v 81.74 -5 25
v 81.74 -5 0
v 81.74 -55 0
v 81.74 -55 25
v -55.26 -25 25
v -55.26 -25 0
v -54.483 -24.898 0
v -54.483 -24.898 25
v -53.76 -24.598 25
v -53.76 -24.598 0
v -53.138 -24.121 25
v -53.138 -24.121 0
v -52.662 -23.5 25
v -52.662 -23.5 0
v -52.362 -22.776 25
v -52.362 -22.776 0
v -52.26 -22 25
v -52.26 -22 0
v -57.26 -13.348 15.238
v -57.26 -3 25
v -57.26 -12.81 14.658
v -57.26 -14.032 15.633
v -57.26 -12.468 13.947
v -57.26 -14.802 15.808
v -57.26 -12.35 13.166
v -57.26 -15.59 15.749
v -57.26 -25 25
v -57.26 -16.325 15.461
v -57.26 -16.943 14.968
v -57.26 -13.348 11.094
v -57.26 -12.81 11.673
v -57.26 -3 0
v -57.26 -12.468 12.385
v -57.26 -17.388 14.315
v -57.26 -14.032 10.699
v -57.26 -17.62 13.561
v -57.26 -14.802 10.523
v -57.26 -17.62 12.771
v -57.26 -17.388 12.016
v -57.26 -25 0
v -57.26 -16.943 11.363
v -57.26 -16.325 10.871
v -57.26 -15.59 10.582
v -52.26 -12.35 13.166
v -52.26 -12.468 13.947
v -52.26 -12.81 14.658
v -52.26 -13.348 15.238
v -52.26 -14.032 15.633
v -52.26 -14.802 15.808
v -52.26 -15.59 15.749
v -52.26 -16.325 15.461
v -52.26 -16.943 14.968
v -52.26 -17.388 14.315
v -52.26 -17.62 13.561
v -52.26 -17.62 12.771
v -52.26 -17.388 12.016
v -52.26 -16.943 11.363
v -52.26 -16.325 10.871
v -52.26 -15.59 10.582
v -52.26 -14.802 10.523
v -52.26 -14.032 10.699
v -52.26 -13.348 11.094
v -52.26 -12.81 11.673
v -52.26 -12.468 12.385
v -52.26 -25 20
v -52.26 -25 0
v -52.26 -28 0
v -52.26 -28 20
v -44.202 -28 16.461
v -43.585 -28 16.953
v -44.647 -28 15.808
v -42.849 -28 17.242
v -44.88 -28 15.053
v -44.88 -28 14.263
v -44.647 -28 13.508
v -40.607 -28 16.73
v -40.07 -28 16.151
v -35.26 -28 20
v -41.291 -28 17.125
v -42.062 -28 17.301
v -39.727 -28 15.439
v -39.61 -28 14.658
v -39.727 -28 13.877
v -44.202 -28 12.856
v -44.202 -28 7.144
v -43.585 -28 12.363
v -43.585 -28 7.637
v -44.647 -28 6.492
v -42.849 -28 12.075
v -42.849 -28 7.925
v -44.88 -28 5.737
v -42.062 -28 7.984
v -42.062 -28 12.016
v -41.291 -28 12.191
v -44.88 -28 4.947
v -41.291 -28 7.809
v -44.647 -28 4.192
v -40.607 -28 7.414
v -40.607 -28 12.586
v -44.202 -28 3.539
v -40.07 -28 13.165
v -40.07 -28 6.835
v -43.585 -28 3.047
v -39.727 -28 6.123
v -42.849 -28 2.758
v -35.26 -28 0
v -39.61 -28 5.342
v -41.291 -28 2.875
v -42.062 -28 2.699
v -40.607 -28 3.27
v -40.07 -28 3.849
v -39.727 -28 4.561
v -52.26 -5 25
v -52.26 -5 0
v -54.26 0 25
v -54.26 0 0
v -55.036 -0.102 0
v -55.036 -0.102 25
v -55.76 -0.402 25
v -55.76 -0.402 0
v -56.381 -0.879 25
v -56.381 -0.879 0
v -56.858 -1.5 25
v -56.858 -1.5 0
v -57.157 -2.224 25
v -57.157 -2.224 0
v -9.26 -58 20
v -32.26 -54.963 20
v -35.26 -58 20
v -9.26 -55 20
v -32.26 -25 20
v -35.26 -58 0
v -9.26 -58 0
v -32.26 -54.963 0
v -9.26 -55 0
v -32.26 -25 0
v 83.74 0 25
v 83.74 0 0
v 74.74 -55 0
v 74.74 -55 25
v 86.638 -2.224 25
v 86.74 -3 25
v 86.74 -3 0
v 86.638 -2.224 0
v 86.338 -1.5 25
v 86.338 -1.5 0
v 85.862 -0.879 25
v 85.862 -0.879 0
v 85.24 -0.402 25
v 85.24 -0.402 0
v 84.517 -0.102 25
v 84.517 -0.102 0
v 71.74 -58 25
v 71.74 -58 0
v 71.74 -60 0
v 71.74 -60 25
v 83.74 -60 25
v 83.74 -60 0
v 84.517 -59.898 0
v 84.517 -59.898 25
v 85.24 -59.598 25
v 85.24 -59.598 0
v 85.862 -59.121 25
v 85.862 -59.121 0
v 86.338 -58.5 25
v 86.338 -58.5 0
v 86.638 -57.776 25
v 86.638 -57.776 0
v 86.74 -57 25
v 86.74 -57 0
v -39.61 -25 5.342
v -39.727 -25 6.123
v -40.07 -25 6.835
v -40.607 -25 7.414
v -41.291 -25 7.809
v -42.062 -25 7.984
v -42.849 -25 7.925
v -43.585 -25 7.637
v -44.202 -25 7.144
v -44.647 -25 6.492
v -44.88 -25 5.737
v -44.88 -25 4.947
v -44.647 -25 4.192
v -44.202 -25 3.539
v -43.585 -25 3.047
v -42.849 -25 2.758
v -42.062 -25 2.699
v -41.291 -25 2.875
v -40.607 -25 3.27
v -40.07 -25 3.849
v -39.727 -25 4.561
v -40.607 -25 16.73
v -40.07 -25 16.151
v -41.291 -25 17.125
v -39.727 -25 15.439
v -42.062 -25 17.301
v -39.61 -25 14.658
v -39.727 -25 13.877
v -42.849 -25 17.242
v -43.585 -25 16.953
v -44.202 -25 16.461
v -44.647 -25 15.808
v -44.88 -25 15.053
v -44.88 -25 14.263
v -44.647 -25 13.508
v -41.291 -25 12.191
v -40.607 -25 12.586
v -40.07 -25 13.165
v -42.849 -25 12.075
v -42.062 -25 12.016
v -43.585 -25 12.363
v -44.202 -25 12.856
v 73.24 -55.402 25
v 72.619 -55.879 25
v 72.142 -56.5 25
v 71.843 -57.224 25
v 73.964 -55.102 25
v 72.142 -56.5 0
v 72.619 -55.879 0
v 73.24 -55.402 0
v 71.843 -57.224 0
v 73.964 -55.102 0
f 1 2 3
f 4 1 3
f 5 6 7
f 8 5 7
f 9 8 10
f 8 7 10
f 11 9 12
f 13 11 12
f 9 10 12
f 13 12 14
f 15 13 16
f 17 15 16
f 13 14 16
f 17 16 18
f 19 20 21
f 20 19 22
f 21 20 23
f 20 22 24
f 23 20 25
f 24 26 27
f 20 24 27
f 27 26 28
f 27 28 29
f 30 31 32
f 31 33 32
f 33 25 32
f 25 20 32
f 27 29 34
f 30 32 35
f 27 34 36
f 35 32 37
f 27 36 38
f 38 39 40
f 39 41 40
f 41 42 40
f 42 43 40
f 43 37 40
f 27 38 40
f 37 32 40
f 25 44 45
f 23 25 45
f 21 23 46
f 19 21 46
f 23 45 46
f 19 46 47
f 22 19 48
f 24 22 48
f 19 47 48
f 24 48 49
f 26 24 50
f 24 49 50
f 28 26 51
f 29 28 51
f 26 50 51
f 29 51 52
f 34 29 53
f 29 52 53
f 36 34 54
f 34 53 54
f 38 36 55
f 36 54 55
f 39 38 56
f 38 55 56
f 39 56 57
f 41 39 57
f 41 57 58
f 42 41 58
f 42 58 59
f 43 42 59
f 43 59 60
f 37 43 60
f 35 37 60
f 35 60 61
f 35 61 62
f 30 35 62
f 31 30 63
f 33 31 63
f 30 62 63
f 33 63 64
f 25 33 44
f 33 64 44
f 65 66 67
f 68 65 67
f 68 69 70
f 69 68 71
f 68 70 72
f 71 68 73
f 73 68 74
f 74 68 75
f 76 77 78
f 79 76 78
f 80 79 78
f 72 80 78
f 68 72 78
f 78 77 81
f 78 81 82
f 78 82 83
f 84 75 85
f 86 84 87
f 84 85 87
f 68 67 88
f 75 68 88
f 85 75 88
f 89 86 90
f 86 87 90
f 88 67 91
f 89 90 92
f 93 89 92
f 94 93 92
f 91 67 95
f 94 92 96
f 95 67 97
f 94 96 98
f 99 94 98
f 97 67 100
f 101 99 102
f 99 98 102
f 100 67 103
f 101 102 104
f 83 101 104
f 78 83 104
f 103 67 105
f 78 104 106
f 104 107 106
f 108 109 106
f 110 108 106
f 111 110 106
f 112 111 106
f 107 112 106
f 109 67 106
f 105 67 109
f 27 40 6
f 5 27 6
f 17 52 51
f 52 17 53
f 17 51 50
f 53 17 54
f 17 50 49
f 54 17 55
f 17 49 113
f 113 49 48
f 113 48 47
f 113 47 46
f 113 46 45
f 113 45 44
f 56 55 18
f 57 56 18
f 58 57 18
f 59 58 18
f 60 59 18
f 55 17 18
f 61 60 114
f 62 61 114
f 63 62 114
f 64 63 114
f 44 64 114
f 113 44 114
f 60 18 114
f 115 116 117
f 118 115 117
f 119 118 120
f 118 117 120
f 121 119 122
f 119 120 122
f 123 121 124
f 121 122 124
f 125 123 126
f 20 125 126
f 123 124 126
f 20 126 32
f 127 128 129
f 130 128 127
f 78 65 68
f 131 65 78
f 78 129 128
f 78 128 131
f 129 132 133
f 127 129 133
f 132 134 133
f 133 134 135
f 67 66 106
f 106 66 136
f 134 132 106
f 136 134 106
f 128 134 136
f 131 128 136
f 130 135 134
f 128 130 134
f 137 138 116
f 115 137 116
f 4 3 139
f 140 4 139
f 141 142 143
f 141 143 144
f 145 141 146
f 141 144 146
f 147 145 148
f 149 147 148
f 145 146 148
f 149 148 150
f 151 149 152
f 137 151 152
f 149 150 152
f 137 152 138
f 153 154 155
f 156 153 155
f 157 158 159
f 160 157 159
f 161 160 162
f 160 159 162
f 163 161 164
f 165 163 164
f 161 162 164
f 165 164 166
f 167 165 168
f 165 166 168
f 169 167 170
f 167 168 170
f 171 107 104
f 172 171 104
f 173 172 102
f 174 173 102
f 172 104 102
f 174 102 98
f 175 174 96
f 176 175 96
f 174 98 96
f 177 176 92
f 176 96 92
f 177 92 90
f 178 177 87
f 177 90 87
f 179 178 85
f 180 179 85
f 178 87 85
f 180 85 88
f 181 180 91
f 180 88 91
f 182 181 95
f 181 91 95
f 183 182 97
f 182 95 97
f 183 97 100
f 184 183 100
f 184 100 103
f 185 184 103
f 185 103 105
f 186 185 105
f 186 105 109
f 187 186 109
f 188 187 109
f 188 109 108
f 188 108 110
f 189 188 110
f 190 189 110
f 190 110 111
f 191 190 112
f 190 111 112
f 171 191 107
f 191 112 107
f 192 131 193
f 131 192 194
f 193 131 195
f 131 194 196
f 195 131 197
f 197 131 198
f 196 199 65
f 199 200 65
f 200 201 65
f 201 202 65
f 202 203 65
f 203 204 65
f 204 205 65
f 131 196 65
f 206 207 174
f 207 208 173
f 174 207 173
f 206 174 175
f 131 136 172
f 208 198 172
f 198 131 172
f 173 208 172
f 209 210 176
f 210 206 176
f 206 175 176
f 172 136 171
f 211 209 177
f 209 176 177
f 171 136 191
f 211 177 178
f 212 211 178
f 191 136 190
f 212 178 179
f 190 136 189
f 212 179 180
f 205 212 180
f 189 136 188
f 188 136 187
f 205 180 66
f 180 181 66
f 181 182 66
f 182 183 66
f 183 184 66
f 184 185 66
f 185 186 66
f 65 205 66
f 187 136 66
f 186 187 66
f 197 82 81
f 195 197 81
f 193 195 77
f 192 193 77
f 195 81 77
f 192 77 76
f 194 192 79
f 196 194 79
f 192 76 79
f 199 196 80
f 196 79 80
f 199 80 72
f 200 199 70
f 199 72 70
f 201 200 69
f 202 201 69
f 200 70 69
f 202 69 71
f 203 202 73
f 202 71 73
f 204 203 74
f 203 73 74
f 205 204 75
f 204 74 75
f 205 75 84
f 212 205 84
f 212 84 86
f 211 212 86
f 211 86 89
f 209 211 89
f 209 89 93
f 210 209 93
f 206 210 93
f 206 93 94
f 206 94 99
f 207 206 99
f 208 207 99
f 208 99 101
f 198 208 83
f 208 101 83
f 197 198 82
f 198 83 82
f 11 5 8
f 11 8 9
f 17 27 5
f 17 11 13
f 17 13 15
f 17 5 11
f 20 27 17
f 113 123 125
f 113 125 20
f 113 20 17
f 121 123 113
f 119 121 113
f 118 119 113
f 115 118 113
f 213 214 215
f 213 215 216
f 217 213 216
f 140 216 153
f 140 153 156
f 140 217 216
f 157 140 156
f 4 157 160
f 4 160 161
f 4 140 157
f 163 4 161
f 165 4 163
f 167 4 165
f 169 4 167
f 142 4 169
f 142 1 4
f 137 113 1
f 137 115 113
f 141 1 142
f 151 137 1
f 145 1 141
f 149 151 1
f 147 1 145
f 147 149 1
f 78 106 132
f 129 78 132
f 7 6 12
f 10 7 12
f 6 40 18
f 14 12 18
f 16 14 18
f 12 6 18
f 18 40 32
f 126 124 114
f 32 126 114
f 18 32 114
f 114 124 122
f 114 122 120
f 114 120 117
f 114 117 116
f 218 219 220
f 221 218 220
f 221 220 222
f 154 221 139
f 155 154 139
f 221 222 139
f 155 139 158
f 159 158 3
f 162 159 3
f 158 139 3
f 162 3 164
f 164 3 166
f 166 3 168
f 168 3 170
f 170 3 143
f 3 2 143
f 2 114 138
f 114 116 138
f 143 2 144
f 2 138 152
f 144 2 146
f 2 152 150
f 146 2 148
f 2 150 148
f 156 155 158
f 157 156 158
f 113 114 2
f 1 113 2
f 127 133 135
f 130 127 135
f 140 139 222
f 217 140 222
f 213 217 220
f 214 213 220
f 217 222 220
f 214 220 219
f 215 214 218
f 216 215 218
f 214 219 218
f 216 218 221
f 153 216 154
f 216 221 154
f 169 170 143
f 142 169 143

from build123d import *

# Parameters (mm, degrees)
F1_DEPTH  = 25
F2_R      = 2.65
F3_DEPTH  = 5
F5_W      = 40
F5_H      = 20
F5_R      = 2.65
F6_DEPTH  = 3
F7_R      = 1
F10_DEPTH = 20
F11_R     = 2.65
F12_DEPTH = 3


with BuildPart() as f1:
    # F0 (on Top) → F1 (new body)
    with BuildSketch(Plane.XY):
        with BuildLine():
            Line((83.740353, 0), (-54.259647, 0))
            ThreePointArc((-54.259647, 0), (-56.380968, -0.87868), (-57.259647, -3))
            Line((-57.259647, -3), (-57.259647, -25))
            Line((-57.259647, -25), (-55.259647, -25))
            ThreePointArc((-55.259647, -25), (-53.138327, -24.12132), (-52.259647, -22))
            Line((-52.259647, -22), (-52.259647, -5))
            Line((-52.259647, -5), (81.740353, -5))
            Line((81.740353, -5), (81.740353, -55))
            Line((81.740353, -55), (74.740353, -55))
            ThreePointArc((74.740353, -55), (72.619032, -55.87868), (71.740353, -58))
            Line((71.740353, -58), (71.740353, -60))
            Line((71.740353, -60), (83.740353, -60))
            ThreePointArc((83.740353, -60), (85.861673, -59.12132), (86.740353, -57))
            Line((86.740353, -57), (86.740353, -3))
            ThreePointArc((86.740353, -3), (85.861673, -0.87868), (83.740353, 0))
        make_face()
    extrude(amount=F1_DEPTH)

    # F2 (on face) → F3 (cut, through all)
    with BuildSketch(Plane.YZ.offset(-52.259647)):
        with Locations((-15, 13.165697)):
            Circle(F2_R)
    extrude(amount=-F3_DEPTH, mode=Mode.SUBTRACT)


with BuildPart() as f6:
    # F5 (on offset) → F6 (new body)
    with BuildSketch(Plane.XZ.offset(60.9)):
        with Locations((-37.213471, 10)):
            Rectangle(F5_W, F5_H)
        with Locations((-47.213471, 5.012961)):
            Circle(F5_R, mode=Mode.SUBTRACT)
        with Locations((-47.213471, 14.988404)):
            Circle(F5_R, mode=Mode.SUBTRACT)
    extrude(amount=F6_DEPTH)

    # F7
    f7_edges = [f6.edges().sort_by_distance(p)[0] for p in [
        (-37.213471, -63.9, 20),
        (-37.213471, -60.9, 20),
        (-37.213471, -63.9, 0),
        (-37.213471, -60.9, 0),
        (-17.213471, -63.9, 10),
        (-17.213471, -60.9, 10),
        (-57.213471, -63.9, 10),
        (-57.213471, -60.9, 10),
    ]]
    fillet(f7_edges, radius=F7_R)


with BuildPart() as f10:
    # F9 (on Top) → F10 (new body)
    with BuildSketch(Plane.XY):
        Polygon((-32.259647, -25), (-52.259647, -25), (-52.259647, -28), (-35.259647, -28), (-35.259647, -58), (-9.259647, -58), (-9.259647, -55), (-32.259647, -54.963204), align=None)
    extrude(amount=F10_DEPTH)

    # F11 (on face) → F12 (cut, through all)
    with BuildSketch(Plane.XZ.offset(28)):
        with Locations((-42.259647, 14.658243)):
            Circle(F11_R)
        with Locations((-42.259647, 5.341757)):
            Circle(F11_R)
    extrude(amount=-F12_DEPTH, mode=Mode.SUBTRACT)


solid = Compound([f1.part, f10.part])
